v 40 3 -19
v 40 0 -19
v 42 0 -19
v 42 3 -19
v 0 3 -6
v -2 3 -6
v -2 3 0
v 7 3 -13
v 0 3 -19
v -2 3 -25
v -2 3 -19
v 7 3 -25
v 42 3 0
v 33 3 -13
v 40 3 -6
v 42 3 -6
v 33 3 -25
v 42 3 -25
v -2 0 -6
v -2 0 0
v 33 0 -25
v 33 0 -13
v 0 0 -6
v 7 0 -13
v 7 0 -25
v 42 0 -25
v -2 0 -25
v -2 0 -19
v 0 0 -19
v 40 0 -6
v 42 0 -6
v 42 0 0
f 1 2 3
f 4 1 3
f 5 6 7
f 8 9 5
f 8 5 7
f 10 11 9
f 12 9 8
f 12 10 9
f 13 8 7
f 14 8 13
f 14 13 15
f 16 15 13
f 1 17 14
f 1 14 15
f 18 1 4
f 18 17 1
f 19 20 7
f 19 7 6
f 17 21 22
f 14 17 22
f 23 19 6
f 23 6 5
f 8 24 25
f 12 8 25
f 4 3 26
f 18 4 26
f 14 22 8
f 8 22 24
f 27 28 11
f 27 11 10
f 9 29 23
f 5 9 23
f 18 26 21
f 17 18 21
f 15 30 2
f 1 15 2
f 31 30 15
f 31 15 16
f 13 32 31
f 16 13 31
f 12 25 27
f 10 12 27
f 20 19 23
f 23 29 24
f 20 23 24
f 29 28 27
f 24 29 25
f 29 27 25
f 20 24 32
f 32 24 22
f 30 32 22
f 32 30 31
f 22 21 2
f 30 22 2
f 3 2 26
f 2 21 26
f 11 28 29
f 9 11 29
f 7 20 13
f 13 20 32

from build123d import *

# Parameters (mm, degrees)
SKETCH1_W           = 2
SKETCH1_H           = 6
BOSS_EXTRUDE1_DEPTH = 3


with BuildPart() as part:
    # Sketch1 → Boss-Extrude1 (new body)
    with BuildSketch(Plane(origin=(0, 0, 0), x_dir=(1, 0, 0), z_dir=(0, 1, 0))):
        Polygon((0, 6), (0, 0), (40, 0), (40, 6), (40, 19), (40, 25), (33, 25), (33, 13), (20, 13), (7, 13), (7, 25), (0, 25), (0, 19), align=None)
        with Locations((-1, 22)):
            Rectangle(SKETCH1_W, SKETCH1_H)
        with Locations((-1, 3)):
            Rectangle(SKETCH1_W, SKETCH1_H)
        with Locations((41, 3)):
            Rectangle(SKETCH1_W, SKETCH1_H)
        with Locations((41, 22)):
            Rectangle(SKETCH1_W, SKETCH1_H)
    extrude(amount=BOSS_EXTRUDE1_DEPTH)


solid = part.part
